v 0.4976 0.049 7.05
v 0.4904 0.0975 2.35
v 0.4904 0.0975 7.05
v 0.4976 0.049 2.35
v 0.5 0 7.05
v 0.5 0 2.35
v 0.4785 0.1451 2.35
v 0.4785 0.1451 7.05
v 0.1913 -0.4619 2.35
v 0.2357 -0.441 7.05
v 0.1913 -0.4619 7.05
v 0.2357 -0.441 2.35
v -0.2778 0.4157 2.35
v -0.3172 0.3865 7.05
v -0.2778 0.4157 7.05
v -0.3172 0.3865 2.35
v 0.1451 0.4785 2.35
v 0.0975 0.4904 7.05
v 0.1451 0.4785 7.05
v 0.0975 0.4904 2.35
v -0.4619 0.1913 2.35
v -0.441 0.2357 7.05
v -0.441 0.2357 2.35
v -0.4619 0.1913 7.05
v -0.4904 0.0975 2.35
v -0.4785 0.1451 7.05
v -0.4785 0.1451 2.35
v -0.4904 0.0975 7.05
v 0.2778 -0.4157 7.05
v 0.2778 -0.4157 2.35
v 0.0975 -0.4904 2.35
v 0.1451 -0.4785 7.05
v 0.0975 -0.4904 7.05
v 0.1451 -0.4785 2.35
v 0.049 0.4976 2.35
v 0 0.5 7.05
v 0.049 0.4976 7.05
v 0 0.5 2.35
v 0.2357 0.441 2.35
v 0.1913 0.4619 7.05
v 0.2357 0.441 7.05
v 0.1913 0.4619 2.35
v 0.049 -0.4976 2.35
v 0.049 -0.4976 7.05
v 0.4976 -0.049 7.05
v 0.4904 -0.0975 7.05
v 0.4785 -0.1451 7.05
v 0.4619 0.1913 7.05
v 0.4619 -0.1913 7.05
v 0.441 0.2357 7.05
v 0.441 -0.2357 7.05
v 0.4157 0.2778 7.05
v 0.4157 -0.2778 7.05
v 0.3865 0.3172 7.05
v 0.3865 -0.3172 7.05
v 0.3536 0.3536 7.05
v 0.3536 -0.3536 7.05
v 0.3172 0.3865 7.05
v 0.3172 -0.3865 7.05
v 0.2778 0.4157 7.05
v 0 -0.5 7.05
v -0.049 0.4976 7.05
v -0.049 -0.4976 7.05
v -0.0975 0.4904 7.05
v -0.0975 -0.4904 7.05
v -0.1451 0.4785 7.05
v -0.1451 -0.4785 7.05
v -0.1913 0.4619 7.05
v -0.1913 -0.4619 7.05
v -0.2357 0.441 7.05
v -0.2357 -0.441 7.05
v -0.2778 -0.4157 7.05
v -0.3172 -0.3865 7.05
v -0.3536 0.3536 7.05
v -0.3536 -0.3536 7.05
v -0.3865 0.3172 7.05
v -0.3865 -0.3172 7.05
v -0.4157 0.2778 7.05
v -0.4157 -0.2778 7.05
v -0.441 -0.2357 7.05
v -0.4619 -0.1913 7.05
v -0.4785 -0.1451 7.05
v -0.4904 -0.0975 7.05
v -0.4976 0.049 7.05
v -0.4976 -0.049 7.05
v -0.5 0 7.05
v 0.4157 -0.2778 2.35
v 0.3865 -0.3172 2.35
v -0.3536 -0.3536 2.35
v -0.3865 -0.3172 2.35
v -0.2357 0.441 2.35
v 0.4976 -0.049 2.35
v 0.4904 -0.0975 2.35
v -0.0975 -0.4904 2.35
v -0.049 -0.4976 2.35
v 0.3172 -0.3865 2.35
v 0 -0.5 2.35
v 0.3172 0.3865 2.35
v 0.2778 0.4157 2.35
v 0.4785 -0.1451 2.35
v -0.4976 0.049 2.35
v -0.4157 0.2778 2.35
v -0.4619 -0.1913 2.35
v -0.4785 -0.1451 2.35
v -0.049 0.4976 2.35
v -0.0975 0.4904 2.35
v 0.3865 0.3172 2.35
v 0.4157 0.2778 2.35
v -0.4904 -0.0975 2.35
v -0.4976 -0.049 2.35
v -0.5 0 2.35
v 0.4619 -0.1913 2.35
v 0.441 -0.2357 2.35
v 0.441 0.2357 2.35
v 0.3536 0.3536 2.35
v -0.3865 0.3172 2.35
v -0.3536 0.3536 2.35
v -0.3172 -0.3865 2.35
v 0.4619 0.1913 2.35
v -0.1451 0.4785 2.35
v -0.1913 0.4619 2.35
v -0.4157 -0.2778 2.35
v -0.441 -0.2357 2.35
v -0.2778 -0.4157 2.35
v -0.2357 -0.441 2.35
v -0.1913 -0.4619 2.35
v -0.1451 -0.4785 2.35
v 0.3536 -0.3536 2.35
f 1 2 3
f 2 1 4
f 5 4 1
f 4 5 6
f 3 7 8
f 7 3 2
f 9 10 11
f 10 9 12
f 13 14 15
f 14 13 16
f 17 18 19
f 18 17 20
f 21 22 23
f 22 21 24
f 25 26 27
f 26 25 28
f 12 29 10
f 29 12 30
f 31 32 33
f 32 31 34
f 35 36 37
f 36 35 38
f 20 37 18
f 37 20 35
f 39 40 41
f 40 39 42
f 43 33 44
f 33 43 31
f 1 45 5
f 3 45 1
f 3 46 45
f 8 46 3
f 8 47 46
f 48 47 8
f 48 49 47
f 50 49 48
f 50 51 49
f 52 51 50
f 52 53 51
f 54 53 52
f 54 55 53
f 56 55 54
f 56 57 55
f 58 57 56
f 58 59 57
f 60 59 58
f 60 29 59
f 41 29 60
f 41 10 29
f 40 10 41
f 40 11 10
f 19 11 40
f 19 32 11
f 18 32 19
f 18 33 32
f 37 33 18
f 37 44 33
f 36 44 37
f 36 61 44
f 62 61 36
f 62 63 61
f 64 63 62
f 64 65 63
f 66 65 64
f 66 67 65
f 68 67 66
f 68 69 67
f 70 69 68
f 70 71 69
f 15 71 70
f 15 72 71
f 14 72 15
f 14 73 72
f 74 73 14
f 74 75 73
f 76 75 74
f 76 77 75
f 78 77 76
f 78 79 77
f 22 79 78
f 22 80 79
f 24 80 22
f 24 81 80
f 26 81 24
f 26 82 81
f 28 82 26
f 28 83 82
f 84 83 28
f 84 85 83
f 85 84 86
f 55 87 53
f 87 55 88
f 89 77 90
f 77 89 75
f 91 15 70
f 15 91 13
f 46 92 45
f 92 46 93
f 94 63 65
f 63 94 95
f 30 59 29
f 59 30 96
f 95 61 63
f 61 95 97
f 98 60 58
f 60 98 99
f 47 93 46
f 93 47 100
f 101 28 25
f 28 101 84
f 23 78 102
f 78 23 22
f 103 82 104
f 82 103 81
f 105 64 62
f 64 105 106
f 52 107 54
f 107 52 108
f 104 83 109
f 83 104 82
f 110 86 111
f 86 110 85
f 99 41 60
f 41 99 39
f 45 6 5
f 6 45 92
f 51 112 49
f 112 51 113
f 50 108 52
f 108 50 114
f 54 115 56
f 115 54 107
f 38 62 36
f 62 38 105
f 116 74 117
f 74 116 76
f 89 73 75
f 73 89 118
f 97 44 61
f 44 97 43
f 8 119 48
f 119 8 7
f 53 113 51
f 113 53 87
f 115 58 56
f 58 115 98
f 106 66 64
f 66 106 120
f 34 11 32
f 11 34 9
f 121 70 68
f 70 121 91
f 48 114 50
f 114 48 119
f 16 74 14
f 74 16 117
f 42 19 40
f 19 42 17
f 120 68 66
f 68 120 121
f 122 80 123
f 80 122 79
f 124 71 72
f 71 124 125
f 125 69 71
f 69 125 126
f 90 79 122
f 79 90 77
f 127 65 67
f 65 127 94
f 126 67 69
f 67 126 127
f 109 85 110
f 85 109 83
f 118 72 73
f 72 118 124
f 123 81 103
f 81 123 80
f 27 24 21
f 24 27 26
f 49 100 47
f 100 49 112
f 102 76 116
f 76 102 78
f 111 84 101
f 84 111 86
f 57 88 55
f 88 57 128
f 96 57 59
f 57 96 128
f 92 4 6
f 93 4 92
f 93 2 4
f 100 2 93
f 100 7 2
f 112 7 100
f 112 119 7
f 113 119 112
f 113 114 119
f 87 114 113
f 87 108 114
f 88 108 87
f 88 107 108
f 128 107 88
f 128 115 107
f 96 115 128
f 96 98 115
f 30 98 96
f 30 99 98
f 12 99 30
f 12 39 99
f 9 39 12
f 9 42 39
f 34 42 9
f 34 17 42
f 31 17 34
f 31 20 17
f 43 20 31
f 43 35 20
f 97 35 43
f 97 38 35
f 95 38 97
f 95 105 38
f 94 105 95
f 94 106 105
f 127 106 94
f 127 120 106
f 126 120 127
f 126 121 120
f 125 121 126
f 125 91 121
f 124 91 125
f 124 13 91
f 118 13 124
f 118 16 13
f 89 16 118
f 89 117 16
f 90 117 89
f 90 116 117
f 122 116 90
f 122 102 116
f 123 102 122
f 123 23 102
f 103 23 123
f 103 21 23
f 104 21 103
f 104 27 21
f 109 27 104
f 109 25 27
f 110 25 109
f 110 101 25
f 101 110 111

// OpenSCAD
module toggle_switch() {
    union() {
        // Body of the switch
        translate([0, 0, 2.35])
            cylinder(h=4.7, d=1.0, $fn=64);
        
        // Toggle part of the switch
        translate([0, 0, 4.7])
            cylinder(h=2.0, d=0.5, $fn=64);
    }
}

toggle_switch();
